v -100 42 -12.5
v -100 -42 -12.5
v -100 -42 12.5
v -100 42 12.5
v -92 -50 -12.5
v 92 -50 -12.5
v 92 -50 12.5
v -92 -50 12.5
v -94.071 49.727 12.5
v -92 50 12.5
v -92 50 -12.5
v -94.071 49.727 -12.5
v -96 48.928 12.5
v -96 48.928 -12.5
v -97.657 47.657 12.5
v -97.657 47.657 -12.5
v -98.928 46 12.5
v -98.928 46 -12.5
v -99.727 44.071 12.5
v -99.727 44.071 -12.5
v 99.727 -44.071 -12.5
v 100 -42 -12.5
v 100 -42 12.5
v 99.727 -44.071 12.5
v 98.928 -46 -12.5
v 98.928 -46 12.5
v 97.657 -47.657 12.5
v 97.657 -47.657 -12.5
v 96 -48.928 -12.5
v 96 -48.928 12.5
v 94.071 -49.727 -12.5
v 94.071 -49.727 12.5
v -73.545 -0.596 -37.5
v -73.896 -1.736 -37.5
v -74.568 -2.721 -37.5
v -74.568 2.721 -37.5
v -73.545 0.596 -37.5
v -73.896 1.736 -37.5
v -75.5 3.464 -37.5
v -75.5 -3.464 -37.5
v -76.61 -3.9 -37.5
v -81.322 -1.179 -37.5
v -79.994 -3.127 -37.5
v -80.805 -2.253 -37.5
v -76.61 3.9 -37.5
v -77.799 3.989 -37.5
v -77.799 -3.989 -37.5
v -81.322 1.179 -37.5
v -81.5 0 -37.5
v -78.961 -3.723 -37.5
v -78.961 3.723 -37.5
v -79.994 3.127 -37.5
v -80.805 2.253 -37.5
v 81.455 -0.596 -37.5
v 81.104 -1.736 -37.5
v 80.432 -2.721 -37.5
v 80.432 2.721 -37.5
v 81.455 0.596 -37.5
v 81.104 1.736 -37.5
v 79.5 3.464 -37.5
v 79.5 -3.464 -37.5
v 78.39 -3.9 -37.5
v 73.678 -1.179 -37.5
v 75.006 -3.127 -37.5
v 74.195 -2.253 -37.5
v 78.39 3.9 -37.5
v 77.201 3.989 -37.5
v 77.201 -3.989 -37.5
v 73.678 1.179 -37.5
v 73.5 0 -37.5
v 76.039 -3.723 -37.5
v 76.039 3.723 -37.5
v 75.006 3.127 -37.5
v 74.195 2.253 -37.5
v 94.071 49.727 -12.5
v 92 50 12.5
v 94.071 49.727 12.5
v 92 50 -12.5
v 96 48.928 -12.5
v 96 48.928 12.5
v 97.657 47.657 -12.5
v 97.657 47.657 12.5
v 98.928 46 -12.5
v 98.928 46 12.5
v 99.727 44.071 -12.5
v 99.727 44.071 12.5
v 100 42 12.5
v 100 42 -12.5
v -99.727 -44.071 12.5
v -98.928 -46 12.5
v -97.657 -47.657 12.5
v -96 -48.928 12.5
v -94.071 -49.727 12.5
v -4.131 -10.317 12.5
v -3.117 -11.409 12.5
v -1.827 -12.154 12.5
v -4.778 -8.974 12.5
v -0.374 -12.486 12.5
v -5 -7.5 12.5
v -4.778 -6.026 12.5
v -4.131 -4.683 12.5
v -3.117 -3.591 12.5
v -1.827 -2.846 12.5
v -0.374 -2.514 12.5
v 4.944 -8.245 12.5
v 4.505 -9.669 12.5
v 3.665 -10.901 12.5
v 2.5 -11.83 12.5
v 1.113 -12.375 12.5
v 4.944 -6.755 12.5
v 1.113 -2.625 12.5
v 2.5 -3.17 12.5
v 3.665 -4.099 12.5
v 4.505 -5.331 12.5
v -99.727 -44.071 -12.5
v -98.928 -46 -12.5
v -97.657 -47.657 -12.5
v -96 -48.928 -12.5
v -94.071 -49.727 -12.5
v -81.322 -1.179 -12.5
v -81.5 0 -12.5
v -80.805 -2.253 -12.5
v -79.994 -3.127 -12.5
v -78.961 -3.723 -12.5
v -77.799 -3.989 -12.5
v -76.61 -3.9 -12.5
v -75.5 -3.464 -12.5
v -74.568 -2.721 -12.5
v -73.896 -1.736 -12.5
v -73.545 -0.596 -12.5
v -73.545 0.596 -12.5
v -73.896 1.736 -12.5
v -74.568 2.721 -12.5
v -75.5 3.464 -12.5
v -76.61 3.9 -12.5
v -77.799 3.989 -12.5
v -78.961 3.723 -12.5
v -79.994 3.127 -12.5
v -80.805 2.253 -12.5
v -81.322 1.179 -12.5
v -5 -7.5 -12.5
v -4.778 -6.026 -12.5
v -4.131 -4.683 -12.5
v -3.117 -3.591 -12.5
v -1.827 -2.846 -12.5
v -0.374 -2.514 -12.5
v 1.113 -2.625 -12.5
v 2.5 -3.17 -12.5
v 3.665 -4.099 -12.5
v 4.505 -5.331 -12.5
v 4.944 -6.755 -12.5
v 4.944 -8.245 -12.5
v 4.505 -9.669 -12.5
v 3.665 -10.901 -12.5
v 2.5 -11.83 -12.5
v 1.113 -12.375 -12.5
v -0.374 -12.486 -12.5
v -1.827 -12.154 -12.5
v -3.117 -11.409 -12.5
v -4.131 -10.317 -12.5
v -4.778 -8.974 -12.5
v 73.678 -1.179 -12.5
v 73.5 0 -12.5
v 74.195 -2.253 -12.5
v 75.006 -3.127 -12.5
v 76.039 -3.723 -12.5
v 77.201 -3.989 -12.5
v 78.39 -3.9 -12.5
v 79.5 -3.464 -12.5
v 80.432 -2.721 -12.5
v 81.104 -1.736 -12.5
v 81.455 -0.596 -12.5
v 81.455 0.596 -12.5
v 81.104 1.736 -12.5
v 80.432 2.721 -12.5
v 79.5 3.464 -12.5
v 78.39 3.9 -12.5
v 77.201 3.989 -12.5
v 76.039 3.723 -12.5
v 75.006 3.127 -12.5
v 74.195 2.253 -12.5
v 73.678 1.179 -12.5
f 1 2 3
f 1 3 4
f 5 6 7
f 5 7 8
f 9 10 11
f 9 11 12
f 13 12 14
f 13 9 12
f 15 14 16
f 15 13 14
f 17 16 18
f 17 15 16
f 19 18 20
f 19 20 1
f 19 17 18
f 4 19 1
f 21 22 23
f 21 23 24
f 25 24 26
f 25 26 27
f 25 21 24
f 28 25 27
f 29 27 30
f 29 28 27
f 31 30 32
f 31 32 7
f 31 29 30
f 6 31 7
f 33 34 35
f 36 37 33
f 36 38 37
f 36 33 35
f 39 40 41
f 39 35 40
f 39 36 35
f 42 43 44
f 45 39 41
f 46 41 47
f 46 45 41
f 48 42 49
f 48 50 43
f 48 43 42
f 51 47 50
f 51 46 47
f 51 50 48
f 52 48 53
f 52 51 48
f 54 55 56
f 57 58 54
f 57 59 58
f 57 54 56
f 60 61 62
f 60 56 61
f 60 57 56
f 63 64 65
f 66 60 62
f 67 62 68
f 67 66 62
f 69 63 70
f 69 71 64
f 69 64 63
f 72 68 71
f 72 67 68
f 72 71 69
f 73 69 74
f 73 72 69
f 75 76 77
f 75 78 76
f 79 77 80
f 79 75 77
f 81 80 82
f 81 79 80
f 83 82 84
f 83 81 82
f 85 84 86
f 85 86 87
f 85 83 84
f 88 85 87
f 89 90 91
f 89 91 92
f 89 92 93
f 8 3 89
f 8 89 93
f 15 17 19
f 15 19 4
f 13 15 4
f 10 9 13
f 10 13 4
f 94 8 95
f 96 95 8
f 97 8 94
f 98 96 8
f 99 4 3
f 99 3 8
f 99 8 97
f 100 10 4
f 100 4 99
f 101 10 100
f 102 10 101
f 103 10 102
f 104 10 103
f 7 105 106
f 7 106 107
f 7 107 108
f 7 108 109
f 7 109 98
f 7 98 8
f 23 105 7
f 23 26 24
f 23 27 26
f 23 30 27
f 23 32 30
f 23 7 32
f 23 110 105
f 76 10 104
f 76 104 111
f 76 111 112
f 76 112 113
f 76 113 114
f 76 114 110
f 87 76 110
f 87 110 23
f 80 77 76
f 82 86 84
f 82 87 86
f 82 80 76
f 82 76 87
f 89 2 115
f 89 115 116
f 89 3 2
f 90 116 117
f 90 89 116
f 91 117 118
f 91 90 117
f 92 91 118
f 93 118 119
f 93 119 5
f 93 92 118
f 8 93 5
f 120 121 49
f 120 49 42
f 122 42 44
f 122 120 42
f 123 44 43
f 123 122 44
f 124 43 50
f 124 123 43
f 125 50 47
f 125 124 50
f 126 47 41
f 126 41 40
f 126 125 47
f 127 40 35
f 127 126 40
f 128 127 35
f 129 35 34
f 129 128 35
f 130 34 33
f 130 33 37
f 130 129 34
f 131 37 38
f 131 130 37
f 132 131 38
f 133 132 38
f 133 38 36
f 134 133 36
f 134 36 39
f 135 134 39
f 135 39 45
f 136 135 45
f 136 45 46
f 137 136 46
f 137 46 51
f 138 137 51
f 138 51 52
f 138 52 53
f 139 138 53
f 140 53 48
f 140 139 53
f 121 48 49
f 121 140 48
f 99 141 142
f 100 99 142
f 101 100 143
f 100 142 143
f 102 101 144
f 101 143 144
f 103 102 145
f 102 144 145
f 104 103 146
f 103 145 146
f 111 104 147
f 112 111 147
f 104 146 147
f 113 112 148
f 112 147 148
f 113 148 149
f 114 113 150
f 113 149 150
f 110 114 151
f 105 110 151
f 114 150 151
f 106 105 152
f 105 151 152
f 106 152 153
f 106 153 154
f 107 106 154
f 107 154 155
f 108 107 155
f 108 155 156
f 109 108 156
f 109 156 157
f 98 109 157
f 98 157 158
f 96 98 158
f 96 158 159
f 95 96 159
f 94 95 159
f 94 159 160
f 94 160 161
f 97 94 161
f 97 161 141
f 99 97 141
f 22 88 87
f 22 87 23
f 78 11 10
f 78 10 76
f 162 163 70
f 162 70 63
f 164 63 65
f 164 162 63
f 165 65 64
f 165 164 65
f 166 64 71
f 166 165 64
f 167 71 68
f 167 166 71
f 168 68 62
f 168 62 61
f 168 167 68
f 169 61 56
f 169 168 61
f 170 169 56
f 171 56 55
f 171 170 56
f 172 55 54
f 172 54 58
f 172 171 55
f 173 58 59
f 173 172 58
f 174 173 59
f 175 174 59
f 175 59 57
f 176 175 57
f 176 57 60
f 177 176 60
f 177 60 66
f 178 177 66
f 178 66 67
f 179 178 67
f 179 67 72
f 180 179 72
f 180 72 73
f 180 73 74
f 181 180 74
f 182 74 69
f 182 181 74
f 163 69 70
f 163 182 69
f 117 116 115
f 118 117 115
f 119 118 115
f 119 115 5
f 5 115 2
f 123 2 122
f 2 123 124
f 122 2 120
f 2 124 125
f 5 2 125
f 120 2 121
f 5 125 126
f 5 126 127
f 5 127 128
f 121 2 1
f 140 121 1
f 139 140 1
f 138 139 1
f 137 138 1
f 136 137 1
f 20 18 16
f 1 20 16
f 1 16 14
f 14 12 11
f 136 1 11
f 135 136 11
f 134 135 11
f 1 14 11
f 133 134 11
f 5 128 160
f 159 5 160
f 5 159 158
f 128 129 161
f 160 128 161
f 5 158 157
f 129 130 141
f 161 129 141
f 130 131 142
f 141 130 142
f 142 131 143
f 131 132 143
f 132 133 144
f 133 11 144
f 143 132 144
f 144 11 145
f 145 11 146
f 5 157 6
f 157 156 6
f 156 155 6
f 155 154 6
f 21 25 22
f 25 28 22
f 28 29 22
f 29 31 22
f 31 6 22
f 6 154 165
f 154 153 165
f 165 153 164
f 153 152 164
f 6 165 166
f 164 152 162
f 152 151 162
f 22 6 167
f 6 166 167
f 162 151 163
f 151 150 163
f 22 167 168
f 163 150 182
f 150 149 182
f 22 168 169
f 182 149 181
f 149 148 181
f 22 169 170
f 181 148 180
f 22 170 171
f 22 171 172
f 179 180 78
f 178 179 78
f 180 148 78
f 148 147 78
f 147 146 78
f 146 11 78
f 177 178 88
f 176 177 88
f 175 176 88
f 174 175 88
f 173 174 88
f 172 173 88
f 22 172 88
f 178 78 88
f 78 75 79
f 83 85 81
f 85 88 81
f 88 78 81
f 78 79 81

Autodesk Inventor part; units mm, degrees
ref_plane "YZ Plane" through (0, 0, 0) normal (1, 0, 0) x (0, 1, 0)
ref_plane "XZ Plane" through (0, 0, 0) normal (0, 1, 0) x (-1, 0, 0)
ref_plane "XY Plane" through (0, 0, 0) normal (0, 0, 1) x (1, 0, 0)
sketch "Sketch1" plane through (0, 0, 0) normal (0, 0, 1) x (1, 0, 0)
  line L0 (-100, 50) -> (100, 50)
  line L1 (100, 50) -> (100, -50)
  line L2 (100, -50) -> (-100, -50)
  line L3 (-100, -50) -> (-100, 50)
  line L4 (-100, 50) -> (100, -50) construction
  line L5 (100, 50) -> (-100, -50) construction
  point P0 (0, 0)
  dimension "d0" = 200
  dimension "d1" = 100
extrude "Extrusion1" add sketch "Sketch1" along normal mid plane 25
fillet "Fillet1" radius 8 4 edges at (100, 50, 0) (-100, 50, 0) (100, -50, 0) (-100, -50, 0)
sketch "Sketch2" plane through (0, 0, -12.5) normal (0, 0, -1) x (-1, 0, 0)
  line L0 (-77.5, 10) -> (77.5, 10)
  line L1 (77.5, 10) -> (77.5, -10)
  line L2 (77.5, -10) -> (-77.5, -10)
  line L3 (-77.5, -10) -> (-77.5, 10)
  line L4 (-77.5, 10) -> (77.5, -10) construction
  line L5 (77.5, 10) -> (-77.5, -10) construction
  circle A0 centre (-77.5, 0) radius 4
  circle A1 centre (77.5, 0) radius 4
  point P0 (0, 0)
  dimension "d5" = 155
  dimension "d6" = 20
  dimension "d7" = 8
  dimension "d8" = 8
extrude "Extrusion2" add sketch "Sketch2" along normal blind 25 contours A0 L3 | L3 A0 | A1 L1 | L1 A1
sketch "Sketch3" plane through (0, 0, -12.5) normal (0, 0, -1) x (-1, 0, 0)
  line L0 (-92, -50) -> (92, -50) projected
  line L1 (0, -50) -> (0, -7.5)
  circle A0 centre (0, -7.5) radius 5
  point P0 (0, 0)
  dimension "d11" = 42.5
  dimension "d12" = 10
extrude "Extrusion3" cut sketch "Sketch3" against normal blind 25
properties part number "CAJA REDUCTORA"
